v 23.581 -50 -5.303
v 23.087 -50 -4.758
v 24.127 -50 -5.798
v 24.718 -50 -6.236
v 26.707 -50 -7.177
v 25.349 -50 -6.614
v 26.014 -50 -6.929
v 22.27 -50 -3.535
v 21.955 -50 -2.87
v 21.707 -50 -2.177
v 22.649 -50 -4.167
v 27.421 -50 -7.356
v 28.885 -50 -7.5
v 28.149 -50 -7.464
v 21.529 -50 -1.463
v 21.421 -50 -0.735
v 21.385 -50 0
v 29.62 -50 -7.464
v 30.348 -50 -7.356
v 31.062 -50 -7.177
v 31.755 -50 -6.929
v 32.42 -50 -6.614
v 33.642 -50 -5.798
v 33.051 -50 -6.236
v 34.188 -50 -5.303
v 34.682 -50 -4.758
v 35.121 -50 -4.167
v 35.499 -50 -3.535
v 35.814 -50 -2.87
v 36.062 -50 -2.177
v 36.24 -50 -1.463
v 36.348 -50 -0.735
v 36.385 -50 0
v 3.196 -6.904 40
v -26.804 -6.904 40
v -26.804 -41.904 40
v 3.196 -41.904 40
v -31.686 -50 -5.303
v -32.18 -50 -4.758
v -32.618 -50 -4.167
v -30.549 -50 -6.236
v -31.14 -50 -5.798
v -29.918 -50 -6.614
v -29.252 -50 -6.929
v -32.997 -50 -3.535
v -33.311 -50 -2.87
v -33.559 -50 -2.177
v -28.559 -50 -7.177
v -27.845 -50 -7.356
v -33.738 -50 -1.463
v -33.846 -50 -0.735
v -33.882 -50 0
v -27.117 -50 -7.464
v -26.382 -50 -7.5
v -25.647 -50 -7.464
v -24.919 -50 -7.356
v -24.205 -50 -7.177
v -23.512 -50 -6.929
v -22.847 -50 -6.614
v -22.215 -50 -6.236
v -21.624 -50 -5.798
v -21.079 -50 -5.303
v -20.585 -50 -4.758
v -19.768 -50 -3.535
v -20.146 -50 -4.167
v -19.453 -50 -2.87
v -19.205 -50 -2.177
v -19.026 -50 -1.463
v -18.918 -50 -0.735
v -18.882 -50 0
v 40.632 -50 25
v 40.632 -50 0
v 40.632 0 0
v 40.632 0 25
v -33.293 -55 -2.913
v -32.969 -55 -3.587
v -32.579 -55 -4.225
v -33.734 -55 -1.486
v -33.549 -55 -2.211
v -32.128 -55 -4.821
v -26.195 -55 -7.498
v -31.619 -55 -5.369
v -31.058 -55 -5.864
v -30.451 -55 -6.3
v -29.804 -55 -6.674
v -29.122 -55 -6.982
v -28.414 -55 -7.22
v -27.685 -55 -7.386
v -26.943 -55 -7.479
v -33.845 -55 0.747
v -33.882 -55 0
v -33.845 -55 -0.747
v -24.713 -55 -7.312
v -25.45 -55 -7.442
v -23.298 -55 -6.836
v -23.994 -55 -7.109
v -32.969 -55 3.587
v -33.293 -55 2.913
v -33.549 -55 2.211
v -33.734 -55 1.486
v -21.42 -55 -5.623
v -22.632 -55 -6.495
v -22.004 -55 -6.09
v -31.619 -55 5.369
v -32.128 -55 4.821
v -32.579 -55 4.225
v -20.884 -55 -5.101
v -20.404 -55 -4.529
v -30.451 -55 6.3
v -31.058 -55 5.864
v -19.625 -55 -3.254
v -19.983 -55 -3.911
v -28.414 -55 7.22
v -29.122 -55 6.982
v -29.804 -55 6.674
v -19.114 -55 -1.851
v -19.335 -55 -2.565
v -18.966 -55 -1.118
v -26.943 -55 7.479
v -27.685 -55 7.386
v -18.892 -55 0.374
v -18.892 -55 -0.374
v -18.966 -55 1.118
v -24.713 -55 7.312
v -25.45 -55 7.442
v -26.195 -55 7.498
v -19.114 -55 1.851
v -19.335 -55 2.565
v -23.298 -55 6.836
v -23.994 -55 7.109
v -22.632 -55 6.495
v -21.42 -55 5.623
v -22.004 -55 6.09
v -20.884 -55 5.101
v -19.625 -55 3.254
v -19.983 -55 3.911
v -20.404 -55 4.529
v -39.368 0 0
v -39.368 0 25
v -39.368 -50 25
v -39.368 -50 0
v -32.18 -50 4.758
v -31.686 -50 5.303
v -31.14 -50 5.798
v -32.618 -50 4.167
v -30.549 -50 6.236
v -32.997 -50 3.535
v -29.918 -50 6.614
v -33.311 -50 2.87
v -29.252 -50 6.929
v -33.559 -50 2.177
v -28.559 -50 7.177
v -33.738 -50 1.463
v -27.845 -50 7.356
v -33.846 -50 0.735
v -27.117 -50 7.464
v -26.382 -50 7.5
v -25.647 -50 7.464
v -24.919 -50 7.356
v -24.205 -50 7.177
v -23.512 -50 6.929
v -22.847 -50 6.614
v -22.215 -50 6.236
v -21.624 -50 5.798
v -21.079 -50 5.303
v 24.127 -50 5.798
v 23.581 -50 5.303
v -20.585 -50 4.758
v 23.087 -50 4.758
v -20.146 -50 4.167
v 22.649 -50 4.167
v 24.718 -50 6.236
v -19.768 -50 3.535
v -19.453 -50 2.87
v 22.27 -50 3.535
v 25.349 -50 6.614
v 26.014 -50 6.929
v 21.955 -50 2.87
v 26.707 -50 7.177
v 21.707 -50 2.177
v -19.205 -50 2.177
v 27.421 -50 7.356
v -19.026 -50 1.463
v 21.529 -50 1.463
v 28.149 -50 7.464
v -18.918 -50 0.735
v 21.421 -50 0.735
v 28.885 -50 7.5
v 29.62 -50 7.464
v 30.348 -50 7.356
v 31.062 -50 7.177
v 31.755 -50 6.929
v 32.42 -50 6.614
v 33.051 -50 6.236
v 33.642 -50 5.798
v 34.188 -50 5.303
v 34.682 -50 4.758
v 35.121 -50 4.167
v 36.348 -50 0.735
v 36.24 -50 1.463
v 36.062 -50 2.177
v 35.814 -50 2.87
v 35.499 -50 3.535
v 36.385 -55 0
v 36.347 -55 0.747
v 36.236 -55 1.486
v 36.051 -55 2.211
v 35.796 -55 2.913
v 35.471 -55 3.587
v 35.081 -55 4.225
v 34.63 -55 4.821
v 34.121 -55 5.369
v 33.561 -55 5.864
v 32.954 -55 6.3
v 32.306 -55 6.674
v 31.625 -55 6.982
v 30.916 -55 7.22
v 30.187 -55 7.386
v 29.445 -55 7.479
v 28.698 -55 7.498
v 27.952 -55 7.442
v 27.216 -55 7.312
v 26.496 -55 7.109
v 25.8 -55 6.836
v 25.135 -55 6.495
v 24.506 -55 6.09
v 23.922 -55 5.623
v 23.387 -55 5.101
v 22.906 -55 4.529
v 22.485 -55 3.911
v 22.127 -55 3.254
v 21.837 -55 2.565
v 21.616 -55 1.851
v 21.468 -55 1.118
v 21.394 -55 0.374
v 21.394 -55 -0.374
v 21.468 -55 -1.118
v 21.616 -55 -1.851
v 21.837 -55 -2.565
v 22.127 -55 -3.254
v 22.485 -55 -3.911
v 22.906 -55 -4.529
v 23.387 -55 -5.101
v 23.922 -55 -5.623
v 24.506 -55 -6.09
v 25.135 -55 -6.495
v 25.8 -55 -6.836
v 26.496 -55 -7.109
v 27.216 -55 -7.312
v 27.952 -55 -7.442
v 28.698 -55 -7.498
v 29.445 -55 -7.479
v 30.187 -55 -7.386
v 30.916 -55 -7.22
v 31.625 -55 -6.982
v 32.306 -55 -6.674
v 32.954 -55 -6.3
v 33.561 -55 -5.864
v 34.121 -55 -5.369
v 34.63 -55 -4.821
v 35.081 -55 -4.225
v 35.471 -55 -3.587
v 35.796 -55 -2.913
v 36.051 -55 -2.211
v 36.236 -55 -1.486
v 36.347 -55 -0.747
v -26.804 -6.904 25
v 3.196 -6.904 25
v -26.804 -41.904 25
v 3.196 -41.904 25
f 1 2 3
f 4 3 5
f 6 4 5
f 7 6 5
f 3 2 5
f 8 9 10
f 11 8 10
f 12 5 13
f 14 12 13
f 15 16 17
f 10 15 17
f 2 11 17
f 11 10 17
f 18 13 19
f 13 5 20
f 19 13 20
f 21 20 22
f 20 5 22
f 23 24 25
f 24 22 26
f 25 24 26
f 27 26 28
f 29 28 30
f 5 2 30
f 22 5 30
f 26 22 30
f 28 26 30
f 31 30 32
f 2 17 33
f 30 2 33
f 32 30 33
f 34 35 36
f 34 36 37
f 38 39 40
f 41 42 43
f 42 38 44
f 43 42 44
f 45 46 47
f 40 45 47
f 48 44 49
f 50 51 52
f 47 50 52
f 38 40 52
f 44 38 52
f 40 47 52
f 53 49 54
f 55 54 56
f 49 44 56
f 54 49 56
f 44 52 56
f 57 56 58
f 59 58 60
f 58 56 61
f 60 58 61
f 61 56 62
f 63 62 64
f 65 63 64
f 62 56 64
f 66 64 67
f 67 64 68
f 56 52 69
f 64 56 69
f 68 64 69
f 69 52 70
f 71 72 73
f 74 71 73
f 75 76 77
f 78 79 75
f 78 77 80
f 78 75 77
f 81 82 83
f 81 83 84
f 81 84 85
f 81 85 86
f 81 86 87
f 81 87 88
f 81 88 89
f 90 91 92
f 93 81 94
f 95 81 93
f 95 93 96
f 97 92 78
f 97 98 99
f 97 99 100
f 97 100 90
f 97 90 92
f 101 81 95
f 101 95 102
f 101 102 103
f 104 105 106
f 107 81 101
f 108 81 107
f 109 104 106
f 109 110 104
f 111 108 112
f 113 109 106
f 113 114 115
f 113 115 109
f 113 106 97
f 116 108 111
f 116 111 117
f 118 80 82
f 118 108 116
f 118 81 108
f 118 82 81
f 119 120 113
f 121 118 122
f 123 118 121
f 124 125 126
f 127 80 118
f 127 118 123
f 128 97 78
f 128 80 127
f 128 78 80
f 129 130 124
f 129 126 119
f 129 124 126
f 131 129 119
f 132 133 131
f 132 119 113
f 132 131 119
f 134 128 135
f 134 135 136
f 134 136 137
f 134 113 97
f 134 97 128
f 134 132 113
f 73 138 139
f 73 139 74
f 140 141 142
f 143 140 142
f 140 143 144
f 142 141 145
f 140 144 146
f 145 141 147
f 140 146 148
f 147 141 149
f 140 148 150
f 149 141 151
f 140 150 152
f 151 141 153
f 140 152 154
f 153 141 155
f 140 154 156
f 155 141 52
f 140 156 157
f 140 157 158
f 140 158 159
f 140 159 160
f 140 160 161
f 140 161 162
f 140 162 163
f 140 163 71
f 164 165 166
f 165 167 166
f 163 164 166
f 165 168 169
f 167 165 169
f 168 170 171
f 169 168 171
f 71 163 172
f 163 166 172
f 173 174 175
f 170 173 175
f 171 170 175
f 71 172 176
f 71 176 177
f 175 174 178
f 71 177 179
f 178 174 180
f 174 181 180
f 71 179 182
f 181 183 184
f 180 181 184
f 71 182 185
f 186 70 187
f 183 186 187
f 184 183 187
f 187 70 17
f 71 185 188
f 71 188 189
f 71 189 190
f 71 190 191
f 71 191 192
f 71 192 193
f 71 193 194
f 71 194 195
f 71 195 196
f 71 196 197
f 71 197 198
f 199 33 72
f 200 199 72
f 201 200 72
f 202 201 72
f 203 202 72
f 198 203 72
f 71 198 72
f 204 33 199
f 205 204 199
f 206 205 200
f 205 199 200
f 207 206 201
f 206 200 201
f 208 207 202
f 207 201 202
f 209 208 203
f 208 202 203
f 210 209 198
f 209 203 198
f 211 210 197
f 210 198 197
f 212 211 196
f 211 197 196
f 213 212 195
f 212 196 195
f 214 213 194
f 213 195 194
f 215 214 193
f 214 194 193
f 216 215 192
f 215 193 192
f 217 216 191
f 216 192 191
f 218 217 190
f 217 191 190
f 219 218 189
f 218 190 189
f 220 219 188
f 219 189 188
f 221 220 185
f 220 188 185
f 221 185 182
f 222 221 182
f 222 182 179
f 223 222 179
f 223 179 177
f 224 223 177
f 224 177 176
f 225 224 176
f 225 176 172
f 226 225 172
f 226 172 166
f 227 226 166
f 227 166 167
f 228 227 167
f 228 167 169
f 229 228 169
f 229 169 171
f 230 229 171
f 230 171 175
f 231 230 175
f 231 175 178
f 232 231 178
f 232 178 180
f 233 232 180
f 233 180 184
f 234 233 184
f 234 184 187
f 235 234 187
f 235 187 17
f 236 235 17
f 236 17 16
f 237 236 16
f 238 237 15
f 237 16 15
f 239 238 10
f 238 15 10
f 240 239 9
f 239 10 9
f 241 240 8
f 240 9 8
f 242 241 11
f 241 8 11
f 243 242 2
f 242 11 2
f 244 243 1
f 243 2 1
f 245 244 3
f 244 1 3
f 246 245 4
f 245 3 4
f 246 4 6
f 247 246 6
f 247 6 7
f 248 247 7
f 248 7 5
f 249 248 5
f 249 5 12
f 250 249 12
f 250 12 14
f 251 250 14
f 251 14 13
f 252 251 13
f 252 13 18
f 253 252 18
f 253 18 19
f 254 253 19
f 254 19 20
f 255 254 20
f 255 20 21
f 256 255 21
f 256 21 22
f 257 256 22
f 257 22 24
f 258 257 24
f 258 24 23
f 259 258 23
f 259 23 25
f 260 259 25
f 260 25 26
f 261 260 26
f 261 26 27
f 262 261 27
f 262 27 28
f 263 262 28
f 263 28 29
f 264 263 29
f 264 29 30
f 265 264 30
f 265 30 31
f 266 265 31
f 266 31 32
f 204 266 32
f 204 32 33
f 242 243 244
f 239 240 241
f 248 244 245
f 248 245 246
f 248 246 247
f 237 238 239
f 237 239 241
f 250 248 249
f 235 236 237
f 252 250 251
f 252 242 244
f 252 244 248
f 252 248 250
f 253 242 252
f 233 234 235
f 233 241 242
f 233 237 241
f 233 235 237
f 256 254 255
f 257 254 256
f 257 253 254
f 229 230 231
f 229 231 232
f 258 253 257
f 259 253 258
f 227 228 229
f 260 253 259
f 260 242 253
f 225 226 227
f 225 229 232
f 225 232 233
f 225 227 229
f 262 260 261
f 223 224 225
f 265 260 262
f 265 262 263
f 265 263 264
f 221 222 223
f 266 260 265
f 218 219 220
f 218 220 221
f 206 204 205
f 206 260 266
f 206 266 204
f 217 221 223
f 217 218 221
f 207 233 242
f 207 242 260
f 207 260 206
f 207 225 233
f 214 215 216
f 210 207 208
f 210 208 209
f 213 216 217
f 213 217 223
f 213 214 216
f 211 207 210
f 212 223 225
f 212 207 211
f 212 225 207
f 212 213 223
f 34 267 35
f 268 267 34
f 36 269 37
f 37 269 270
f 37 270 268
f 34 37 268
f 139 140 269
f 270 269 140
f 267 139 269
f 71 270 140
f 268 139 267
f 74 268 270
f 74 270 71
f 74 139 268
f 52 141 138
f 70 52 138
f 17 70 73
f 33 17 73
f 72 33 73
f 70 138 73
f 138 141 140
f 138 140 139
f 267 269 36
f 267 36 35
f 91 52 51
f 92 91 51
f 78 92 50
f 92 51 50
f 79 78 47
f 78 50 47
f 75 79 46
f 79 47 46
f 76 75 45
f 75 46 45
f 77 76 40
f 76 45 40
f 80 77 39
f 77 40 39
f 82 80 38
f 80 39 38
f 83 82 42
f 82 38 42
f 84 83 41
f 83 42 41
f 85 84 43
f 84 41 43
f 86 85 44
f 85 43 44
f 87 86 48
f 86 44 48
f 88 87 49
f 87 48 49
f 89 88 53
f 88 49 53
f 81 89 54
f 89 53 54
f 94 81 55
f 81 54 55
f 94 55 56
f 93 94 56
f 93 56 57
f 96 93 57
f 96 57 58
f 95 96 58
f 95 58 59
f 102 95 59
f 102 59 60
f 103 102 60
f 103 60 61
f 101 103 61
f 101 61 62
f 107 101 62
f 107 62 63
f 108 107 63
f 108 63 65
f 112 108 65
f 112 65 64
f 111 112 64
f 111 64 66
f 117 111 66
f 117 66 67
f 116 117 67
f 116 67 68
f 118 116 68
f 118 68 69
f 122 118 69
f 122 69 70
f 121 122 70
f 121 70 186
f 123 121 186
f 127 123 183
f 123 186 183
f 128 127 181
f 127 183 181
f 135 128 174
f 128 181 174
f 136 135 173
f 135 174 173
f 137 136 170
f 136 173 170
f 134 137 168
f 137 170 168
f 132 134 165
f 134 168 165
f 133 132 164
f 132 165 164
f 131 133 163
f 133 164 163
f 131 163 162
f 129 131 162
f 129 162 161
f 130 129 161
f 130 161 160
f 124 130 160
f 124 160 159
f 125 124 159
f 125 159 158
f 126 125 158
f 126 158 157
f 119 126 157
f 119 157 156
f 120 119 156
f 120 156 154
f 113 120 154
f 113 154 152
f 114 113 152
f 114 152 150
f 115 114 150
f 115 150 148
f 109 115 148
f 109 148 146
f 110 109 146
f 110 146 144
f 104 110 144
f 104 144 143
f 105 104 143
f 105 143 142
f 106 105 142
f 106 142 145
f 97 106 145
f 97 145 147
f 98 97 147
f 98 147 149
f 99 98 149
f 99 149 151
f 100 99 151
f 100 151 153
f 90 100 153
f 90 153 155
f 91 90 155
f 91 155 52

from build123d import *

# Parameters (mm, degrees)
F0_W     = 80
F0_H     = 50
F1_DEPTH = 25
F2_W     = 30
F2_H     = 35
F3_DEPTH = 15
F5_DEPTH = 5


with BuildPart() as f1:
    # F0 (on Top) → F1 (new body)
    with BuildSketch(Plane.XY):
        with Locations((0.632411, -25)):
            Rectangle(F0_W, F0_H)
    extrude(amount=F1_DEPTH)

    # F2 (on face) → F3 (join)
    with BuildSketch(Plane.XY.offset(25)):
        with Locations((-11.804453, -24.404109)):
            Rectangle(F2_W, F2_H)
    extrude(amount=F3_DEPTH)

    # F4 (on face) → F5 (join)
    with BuildSketch(Plane.XZ.offset(50)):
        with BuildLine():
            Line((-33.882271, 0), (-18.882271, 0))
            ThreePointArc((-18.882271, 0), (-26.382271, 7.5), (-33.882271, 0))
        make_face()
        with BuildLine():
            Line((36.384543, 0), (21.384543, 0))
            ThreePointArc((21.384543, 0), (28.884543, -7.5), (36.384543, 0))
        make_face()
        with BuildLine():
            ThreePointArc((-33.882271, 0), (-26.382271, -7.5), (-18.882271, 0))
            Line((-18.882271, 0), (-33.882271, 0))
        make_face()
        with BuildLine():
            ThreePointArc((36.384543, 0), (28.884543, 7.5), (21.384543, 0))
            Line((21.384543, 0), (36.384543, 0))
        make_face()
    extrude(amount=F5_DEPTH)


solid = f1.part
